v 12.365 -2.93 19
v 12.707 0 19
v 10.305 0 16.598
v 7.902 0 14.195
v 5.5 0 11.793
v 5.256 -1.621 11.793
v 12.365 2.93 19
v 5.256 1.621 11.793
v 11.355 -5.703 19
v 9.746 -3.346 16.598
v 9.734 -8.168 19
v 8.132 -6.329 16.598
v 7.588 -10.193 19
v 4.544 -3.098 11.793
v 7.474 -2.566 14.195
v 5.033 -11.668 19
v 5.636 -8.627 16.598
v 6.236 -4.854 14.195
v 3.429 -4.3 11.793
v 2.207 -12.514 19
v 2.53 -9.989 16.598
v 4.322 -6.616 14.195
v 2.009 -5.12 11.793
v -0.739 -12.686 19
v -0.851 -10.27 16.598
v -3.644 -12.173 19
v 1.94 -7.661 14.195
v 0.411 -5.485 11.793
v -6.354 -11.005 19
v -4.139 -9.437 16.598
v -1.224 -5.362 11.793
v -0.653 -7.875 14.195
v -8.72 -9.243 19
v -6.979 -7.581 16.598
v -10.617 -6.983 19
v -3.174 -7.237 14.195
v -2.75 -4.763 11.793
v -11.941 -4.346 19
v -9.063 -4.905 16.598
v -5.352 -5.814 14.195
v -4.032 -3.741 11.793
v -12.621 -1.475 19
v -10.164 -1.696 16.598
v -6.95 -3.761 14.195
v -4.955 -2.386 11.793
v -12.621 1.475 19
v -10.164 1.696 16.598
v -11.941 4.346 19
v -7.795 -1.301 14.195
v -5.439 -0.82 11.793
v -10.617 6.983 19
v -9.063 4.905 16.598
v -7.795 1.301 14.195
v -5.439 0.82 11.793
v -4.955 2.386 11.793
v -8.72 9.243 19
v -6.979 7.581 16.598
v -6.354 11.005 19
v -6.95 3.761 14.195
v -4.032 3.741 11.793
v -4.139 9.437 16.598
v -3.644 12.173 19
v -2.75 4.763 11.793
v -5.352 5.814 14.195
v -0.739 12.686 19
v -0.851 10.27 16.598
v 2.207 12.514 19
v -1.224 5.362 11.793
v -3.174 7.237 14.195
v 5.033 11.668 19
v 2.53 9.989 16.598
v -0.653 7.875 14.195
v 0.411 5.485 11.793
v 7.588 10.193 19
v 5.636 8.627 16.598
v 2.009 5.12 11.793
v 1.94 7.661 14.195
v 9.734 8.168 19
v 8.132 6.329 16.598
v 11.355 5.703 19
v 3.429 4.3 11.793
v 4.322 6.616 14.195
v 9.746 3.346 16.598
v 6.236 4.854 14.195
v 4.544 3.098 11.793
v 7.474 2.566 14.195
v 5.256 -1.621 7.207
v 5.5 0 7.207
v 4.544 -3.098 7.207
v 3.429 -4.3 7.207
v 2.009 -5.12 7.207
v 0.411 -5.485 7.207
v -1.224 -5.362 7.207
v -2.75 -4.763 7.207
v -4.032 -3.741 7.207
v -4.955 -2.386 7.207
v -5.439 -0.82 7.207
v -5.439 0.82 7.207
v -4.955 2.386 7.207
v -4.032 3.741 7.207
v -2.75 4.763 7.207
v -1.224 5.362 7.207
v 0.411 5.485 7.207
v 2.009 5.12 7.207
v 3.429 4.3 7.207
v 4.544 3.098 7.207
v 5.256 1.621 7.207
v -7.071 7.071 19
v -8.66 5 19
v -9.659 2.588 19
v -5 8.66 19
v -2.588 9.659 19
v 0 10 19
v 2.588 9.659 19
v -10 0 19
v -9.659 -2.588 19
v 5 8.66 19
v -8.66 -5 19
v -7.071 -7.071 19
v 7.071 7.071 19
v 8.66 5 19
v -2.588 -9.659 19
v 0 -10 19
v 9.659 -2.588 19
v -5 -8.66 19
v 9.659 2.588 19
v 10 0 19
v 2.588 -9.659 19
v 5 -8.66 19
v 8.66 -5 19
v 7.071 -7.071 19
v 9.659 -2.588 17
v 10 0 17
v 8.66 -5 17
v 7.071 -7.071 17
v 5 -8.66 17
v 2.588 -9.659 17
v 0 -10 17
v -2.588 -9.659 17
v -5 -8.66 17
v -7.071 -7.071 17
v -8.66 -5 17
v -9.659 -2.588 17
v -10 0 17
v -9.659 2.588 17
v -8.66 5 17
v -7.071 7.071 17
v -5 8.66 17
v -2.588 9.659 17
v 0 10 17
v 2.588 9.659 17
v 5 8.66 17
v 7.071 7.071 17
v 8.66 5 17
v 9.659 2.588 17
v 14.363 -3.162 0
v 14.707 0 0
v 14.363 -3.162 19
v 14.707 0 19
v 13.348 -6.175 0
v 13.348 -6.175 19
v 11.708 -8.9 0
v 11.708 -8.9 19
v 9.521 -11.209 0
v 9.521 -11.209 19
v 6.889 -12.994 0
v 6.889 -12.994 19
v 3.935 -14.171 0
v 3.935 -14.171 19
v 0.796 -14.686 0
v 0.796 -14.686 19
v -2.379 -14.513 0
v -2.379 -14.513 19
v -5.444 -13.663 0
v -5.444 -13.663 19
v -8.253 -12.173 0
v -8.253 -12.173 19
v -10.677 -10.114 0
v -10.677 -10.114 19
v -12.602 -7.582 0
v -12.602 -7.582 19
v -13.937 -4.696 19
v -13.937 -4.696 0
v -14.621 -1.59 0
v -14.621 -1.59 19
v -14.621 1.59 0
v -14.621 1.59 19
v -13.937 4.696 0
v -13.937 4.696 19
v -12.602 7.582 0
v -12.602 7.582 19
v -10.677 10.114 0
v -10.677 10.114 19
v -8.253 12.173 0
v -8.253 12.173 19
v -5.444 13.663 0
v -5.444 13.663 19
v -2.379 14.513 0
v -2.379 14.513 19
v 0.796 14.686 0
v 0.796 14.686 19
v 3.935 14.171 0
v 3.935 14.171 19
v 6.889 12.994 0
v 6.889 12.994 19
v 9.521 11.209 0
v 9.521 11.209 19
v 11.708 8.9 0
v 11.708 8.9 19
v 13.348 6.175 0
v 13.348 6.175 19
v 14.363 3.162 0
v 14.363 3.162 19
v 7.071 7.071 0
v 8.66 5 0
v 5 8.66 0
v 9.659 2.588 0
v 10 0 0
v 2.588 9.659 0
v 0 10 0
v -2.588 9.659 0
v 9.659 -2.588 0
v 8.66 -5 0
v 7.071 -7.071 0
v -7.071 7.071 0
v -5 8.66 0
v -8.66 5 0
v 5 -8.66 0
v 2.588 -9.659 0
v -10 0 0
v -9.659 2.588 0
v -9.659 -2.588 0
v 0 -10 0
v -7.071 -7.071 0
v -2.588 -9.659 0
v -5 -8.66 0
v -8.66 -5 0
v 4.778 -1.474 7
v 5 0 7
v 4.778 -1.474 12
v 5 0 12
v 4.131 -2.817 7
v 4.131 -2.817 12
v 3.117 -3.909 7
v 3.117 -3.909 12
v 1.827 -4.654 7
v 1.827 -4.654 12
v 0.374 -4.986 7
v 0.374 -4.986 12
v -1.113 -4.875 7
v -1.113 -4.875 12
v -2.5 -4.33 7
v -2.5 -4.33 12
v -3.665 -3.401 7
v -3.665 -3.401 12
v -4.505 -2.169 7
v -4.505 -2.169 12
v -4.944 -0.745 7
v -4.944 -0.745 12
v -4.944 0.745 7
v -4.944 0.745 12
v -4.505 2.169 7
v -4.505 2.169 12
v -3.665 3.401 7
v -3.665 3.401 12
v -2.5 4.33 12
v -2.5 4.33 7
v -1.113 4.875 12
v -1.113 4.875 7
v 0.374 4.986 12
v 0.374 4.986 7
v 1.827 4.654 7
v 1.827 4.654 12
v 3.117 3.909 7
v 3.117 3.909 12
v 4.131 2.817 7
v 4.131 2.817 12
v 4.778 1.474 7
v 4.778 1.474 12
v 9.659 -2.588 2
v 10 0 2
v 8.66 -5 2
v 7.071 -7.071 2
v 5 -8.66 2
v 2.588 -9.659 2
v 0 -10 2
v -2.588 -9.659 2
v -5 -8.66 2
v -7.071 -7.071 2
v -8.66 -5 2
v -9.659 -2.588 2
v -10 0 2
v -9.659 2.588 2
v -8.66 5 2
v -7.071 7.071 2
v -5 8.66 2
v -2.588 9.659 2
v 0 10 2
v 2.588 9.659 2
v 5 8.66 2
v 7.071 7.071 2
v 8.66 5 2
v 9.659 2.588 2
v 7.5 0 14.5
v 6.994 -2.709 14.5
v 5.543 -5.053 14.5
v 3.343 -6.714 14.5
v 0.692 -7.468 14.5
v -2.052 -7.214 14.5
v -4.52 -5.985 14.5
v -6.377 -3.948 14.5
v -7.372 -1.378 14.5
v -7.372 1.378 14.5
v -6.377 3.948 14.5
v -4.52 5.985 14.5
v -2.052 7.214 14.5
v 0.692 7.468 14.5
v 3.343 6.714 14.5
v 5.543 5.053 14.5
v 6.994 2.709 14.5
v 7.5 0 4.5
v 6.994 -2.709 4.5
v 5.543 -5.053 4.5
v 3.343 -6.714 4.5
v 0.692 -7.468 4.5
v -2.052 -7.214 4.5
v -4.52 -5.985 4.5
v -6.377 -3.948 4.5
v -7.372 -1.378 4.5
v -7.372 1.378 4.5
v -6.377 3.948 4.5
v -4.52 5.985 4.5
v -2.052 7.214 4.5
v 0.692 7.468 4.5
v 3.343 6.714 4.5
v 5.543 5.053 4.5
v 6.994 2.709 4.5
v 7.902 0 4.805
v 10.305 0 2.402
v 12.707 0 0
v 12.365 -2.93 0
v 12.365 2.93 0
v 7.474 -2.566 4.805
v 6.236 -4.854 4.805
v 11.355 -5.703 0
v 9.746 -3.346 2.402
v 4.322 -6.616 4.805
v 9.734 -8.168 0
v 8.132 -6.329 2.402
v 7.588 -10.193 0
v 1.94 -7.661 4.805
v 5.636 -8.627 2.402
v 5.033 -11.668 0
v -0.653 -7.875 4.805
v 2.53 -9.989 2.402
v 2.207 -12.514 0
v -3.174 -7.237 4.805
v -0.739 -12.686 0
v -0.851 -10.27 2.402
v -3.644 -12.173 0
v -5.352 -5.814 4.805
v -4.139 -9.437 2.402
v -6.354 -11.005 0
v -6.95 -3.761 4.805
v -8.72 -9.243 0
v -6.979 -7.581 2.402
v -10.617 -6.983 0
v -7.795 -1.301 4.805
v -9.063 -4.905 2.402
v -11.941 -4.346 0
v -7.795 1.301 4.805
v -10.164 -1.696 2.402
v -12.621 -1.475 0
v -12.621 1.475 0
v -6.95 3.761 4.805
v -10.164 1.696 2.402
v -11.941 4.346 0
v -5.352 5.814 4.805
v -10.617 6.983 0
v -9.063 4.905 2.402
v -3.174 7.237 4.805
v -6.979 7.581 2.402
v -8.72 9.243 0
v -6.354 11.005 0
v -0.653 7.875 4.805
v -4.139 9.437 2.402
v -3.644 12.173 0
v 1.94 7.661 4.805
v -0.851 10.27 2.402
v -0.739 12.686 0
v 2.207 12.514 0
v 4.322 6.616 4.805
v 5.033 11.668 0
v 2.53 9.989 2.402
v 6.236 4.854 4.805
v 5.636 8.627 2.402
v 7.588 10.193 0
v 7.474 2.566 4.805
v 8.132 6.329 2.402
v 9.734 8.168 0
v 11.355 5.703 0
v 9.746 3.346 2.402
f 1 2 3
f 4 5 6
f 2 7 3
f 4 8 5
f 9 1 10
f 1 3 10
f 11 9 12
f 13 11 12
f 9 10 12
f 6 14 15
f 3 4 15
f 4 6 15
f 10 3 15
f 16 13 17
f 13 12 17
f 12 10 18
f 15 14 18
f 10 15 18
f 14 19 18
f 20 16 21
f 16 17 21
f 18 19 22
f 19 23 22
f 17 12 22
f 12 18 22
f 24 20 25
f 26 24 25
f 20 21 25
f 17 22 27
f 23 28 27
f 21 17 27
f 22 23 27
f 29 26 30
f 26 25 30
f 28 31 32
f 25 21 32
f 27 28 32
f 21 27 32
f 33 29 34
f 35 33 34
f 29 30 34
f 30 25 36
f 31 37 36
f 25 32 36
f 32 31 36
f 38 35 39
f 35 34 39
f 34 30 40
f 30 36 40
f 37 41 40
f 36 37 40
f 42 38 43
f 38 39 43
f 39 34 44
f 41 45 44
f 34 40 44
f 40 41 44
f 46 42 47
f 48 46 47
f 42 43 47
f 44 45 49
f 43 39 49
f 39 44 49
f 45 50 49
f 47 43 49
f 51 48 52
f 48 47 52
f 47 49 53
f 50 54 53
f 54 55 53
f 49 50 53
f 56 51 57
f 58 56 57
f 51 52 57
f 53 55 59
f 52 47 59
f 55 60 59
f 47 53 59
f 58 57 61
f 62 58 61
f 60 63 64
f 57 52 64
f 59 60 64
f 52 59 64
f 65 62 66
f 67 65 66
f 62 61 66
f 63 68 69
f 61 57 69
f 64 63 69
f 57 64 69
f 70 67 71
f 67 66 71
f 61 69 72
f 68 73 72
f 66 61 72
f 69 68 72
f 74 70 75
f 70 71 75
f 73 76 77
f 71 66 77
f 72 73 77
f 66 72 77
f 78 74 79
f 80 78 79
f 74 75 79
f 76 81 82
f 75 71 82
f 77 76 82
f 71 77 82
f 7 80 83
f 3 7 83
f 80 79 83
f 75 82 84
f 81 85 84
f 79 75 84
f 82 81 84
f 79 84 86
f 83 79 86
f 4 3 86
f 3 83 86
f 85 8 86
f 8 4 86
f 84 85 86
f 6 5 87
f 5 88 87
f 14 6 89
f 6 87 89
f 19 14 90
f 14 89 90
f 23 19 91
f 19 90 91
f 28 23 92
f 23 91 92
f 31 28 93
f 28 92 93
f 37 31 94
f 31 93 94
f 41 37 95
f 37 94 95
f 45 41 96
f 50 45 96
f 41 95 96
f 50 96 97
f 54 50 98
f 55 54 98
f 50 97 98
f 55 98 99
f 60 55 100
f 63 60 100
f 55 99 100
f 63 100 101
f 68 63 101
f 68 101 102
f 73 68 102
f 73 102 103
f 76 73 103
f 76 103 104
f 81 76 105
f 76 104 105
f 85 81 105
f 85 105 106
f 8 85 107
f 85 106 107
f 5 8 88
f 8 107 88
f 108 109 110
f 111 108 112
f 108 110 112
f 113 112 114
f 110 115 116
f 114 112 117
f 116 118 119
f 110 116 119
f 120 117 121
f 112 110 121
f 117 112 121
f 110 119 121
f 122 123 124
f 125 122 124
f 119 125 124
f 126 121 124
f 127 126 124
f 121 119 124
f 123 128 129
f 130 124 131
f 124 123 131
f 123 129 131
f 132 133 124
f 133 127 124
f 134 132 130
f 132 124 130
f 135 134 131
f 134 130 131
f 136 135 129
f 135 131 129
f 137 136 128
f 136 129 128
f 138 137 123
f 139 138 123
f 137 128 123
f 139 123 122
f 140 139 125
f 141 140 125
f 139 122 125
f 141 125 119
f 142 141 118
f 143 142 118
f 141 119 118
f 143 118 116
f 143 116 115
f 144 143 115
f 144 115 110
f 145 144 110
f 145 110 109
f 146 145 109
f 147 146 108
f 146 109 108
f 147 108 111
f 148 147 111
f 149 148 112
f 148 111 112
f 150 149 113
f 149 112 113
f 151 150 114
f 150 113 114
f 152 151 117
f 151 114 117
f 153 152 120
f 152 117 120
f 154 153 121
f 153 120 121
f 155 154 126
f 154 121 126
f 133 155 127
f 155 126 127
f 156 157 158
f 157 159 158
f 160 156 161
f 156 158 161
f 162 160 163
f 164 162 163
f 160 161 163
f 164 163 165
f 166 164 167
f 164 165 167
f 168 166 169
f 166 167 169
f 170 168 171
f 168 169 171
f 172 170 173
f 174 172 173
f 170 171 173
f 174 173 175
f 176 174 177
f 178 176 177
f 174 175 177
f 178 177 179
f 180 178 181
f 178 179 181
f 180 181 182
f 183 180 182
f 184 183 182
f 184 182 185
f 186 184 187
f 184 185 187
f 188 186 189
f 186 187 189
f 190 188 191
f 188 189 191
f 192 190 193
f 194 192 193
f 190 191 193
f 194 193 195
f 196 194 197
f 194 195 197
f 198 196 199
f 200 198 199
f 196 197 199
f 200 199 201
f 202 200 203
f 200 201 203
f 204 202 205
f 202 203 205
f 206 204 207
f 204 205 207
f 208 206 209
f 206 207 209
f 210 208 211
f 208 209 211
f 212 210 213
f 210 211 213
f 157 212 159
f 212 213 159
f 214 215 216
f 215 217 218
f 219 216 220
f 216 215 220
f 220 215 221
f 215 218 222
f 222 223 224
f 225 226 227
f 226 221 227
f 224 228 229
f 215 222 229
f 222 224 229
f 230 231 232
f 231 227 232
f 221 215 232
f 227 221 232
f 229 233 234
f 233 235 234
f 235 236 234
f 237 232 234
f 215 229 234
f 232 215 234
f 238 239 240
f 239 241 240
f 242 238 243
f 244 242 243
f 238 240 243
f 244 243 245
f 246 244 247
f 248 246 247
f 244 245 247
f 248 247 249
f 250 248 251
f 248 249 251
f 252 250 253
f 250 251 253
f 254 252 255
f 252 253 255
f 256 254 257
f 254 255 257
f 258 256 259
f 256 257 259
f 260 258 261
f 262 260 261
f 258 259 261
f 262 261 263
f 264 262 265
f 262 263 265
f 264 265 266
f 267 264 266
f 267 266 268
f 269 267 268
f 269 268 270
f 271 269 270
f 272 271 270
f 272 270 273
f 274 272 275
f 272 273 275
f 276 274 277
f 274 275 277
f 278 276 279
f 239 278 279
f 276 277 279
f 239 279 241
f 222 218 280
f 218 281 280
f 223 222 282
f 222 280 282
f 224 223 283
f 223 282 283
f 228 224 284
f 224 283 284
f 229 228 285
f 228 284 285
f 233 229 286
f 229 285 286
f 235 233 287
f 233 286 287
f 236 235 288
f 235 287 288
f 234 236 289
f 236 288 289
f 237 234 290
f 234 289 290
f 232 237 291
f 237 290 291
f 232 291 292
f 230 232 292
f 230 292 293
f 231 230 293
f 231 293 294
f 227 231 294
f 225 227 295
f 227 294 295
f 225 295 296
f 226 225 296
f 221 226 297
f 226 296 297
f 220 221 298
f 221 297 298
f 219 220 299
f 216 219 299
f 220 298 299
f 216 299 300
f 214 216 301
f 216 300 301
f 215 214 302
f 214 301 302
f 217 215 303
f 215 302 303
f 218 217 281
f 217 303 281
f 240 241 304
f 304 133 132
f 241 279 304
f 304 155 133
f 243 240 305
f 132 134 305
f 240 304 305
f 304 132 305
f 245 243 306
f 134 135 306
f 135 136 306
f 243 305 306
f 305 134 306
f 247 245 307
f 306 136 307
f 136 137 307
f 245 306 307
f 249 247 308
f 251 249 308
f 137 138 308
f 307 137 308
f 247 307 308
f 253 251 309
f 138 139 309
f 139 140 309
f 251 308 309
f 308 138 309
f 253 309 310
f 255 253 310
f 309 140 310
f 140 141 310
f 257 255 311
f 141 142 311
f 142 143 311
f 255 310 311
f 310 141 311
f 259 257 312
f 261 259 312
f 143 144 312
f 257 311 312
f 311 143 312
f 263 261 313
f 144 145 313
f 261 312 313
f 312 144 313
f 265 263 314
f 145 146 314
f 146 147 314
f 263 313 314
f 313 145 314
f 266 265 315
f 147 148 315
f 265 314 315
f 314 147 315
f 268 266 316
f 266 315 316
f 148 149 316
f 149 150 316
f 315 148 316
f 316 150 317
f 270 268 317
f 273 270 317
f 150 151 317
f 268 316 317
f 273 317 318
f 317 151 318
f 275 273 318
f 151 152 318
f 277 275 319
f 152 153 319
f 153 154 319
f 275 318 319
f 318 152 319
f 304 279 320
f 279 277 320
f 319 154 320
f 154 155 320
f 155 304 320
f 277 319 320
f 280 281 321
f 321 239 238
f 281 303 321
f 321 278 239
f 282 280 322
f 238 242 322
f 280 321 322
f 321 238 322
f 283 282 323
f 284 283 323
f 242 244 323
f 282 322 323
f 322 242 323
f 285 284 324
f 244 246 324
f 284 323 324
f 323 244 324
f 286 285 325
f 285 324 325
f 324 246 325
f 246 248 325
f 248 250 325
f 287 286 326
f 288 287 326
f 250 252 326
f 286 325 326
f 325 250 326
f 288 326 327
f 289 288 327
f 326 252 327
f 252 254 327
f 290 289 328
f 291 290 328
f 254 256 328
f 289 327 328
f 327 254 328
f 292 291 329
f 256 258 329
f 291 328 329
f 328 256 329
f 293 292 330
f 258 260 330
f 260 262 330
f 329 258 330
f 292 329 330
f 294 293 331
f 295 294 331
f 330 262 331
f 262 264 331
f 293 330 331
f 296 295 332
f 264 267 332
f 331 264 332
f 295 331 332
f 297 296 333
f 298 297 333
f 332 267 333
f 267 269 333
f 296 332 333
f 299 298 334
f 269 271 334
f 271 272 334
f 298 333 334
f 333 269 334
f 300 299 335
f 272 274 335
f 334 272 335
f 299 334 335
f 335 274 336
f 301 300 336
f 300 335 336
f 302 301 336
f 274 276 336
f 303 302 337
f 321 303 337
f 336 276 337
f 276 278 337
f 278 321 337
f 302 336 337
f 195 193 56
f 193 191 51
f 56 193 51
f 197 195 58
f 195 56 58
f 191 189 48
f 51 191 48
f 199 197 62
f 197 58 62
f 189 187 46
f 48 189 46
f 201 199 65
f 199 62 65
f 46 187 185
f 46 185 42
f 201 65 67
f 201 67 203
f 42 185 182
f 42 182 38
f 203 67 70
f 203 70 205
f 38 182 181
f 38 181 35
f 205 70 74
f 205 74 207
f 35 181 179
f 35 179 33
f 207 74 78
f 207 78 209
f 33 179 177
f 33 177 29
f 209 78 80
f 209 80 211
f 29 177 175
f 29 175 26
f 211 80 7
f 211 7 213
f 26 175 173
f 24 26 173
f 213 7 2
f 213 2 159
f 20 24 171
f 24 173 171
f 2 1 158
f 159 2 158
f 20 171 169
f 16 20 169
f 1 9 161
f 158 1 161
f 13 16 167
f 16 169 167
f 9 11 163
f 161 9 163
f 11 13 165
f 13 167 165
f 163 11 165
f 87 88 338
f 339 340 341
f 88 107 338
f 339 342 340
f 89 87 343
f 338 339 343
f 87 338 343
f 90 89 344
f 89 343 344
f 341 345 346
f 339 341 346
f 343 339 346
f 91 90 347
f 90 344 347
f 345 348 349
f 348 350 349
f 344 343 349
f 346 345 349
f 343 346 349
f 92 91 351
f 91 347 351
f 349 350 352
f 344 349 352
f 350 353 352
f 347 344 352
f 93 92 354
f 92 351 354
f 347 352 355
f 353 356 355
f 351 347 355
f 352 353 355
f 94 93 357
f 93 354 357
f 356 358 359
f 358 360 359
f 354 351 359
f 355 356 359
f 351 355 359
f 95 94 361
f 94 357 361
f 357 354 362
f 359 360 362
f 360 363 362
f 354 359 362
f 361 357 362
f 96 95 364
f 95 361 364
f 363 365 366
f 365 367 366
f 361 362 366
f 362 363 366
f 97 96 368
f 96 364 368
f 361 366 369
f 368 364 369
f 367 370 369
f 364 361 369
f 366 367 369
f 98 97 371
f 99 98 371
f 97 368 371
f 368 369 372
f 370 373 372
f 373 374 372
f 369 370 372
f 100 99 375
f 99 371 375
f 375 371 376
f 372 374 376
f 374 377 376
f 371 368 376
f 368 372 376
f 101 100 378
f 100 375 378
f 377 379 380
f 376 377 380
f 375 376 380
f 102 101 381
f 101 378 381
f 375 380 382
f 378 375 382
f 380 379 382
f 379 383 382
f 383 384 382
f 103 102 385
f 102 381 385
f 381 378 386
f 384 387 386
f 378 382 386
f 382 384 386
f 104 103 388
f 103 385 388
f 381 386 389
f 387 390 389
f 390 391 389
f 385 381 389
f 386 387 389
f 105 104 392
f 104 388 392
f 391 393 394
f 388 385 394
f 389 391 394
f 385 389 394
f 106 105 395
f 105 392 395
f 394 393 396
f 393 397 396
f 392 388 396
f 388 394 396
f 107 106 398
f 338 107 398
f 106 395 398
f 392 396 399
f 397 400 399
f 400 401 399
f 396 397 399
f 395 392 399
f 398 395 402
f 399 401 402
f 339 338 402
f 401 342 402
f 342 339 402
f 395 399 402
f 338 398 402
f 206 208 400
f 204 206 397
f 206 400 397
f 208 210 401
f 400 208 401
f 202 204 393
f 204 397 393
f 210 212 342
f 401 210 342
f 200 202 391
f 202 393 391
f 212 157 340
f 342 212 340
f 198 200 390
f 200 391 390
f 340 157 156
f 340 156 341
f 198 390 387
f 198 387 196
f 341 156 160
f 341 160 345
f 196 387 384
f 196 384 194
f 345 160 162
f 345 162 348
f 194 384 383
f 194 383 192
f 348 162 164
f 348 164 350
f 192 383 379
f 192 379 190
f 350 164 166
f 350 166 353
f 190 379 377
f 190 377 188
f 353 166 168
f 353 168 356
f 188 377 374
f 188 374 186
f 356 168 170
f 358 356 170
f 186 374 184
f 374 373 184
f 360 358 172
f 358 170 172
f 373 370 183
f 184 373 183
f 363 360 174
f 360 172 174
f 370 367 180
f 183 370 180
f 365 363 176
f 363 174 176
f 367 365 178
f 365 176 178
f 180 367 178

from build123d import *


with BuildPart() as f1:
    # F0 (on Front) → F1 (revolve)
    with BuildSketch(Plane.XZ):
        Polygon((0, 19), (0, 0), (10, 0), (10, 2), (5, 7), (5, 12), (10, 17), (10, 19), align=None)
        Polygon((5.5, 7.207107), (12.707107, 0), (14.707107, 0), (14.707107, 19), (12.707107, 19), (5.5, 11.792893), align=None)
    revolve(axis=Axis((0, 0, 9.5), (0, 0, -1)))


solid = f1.part
